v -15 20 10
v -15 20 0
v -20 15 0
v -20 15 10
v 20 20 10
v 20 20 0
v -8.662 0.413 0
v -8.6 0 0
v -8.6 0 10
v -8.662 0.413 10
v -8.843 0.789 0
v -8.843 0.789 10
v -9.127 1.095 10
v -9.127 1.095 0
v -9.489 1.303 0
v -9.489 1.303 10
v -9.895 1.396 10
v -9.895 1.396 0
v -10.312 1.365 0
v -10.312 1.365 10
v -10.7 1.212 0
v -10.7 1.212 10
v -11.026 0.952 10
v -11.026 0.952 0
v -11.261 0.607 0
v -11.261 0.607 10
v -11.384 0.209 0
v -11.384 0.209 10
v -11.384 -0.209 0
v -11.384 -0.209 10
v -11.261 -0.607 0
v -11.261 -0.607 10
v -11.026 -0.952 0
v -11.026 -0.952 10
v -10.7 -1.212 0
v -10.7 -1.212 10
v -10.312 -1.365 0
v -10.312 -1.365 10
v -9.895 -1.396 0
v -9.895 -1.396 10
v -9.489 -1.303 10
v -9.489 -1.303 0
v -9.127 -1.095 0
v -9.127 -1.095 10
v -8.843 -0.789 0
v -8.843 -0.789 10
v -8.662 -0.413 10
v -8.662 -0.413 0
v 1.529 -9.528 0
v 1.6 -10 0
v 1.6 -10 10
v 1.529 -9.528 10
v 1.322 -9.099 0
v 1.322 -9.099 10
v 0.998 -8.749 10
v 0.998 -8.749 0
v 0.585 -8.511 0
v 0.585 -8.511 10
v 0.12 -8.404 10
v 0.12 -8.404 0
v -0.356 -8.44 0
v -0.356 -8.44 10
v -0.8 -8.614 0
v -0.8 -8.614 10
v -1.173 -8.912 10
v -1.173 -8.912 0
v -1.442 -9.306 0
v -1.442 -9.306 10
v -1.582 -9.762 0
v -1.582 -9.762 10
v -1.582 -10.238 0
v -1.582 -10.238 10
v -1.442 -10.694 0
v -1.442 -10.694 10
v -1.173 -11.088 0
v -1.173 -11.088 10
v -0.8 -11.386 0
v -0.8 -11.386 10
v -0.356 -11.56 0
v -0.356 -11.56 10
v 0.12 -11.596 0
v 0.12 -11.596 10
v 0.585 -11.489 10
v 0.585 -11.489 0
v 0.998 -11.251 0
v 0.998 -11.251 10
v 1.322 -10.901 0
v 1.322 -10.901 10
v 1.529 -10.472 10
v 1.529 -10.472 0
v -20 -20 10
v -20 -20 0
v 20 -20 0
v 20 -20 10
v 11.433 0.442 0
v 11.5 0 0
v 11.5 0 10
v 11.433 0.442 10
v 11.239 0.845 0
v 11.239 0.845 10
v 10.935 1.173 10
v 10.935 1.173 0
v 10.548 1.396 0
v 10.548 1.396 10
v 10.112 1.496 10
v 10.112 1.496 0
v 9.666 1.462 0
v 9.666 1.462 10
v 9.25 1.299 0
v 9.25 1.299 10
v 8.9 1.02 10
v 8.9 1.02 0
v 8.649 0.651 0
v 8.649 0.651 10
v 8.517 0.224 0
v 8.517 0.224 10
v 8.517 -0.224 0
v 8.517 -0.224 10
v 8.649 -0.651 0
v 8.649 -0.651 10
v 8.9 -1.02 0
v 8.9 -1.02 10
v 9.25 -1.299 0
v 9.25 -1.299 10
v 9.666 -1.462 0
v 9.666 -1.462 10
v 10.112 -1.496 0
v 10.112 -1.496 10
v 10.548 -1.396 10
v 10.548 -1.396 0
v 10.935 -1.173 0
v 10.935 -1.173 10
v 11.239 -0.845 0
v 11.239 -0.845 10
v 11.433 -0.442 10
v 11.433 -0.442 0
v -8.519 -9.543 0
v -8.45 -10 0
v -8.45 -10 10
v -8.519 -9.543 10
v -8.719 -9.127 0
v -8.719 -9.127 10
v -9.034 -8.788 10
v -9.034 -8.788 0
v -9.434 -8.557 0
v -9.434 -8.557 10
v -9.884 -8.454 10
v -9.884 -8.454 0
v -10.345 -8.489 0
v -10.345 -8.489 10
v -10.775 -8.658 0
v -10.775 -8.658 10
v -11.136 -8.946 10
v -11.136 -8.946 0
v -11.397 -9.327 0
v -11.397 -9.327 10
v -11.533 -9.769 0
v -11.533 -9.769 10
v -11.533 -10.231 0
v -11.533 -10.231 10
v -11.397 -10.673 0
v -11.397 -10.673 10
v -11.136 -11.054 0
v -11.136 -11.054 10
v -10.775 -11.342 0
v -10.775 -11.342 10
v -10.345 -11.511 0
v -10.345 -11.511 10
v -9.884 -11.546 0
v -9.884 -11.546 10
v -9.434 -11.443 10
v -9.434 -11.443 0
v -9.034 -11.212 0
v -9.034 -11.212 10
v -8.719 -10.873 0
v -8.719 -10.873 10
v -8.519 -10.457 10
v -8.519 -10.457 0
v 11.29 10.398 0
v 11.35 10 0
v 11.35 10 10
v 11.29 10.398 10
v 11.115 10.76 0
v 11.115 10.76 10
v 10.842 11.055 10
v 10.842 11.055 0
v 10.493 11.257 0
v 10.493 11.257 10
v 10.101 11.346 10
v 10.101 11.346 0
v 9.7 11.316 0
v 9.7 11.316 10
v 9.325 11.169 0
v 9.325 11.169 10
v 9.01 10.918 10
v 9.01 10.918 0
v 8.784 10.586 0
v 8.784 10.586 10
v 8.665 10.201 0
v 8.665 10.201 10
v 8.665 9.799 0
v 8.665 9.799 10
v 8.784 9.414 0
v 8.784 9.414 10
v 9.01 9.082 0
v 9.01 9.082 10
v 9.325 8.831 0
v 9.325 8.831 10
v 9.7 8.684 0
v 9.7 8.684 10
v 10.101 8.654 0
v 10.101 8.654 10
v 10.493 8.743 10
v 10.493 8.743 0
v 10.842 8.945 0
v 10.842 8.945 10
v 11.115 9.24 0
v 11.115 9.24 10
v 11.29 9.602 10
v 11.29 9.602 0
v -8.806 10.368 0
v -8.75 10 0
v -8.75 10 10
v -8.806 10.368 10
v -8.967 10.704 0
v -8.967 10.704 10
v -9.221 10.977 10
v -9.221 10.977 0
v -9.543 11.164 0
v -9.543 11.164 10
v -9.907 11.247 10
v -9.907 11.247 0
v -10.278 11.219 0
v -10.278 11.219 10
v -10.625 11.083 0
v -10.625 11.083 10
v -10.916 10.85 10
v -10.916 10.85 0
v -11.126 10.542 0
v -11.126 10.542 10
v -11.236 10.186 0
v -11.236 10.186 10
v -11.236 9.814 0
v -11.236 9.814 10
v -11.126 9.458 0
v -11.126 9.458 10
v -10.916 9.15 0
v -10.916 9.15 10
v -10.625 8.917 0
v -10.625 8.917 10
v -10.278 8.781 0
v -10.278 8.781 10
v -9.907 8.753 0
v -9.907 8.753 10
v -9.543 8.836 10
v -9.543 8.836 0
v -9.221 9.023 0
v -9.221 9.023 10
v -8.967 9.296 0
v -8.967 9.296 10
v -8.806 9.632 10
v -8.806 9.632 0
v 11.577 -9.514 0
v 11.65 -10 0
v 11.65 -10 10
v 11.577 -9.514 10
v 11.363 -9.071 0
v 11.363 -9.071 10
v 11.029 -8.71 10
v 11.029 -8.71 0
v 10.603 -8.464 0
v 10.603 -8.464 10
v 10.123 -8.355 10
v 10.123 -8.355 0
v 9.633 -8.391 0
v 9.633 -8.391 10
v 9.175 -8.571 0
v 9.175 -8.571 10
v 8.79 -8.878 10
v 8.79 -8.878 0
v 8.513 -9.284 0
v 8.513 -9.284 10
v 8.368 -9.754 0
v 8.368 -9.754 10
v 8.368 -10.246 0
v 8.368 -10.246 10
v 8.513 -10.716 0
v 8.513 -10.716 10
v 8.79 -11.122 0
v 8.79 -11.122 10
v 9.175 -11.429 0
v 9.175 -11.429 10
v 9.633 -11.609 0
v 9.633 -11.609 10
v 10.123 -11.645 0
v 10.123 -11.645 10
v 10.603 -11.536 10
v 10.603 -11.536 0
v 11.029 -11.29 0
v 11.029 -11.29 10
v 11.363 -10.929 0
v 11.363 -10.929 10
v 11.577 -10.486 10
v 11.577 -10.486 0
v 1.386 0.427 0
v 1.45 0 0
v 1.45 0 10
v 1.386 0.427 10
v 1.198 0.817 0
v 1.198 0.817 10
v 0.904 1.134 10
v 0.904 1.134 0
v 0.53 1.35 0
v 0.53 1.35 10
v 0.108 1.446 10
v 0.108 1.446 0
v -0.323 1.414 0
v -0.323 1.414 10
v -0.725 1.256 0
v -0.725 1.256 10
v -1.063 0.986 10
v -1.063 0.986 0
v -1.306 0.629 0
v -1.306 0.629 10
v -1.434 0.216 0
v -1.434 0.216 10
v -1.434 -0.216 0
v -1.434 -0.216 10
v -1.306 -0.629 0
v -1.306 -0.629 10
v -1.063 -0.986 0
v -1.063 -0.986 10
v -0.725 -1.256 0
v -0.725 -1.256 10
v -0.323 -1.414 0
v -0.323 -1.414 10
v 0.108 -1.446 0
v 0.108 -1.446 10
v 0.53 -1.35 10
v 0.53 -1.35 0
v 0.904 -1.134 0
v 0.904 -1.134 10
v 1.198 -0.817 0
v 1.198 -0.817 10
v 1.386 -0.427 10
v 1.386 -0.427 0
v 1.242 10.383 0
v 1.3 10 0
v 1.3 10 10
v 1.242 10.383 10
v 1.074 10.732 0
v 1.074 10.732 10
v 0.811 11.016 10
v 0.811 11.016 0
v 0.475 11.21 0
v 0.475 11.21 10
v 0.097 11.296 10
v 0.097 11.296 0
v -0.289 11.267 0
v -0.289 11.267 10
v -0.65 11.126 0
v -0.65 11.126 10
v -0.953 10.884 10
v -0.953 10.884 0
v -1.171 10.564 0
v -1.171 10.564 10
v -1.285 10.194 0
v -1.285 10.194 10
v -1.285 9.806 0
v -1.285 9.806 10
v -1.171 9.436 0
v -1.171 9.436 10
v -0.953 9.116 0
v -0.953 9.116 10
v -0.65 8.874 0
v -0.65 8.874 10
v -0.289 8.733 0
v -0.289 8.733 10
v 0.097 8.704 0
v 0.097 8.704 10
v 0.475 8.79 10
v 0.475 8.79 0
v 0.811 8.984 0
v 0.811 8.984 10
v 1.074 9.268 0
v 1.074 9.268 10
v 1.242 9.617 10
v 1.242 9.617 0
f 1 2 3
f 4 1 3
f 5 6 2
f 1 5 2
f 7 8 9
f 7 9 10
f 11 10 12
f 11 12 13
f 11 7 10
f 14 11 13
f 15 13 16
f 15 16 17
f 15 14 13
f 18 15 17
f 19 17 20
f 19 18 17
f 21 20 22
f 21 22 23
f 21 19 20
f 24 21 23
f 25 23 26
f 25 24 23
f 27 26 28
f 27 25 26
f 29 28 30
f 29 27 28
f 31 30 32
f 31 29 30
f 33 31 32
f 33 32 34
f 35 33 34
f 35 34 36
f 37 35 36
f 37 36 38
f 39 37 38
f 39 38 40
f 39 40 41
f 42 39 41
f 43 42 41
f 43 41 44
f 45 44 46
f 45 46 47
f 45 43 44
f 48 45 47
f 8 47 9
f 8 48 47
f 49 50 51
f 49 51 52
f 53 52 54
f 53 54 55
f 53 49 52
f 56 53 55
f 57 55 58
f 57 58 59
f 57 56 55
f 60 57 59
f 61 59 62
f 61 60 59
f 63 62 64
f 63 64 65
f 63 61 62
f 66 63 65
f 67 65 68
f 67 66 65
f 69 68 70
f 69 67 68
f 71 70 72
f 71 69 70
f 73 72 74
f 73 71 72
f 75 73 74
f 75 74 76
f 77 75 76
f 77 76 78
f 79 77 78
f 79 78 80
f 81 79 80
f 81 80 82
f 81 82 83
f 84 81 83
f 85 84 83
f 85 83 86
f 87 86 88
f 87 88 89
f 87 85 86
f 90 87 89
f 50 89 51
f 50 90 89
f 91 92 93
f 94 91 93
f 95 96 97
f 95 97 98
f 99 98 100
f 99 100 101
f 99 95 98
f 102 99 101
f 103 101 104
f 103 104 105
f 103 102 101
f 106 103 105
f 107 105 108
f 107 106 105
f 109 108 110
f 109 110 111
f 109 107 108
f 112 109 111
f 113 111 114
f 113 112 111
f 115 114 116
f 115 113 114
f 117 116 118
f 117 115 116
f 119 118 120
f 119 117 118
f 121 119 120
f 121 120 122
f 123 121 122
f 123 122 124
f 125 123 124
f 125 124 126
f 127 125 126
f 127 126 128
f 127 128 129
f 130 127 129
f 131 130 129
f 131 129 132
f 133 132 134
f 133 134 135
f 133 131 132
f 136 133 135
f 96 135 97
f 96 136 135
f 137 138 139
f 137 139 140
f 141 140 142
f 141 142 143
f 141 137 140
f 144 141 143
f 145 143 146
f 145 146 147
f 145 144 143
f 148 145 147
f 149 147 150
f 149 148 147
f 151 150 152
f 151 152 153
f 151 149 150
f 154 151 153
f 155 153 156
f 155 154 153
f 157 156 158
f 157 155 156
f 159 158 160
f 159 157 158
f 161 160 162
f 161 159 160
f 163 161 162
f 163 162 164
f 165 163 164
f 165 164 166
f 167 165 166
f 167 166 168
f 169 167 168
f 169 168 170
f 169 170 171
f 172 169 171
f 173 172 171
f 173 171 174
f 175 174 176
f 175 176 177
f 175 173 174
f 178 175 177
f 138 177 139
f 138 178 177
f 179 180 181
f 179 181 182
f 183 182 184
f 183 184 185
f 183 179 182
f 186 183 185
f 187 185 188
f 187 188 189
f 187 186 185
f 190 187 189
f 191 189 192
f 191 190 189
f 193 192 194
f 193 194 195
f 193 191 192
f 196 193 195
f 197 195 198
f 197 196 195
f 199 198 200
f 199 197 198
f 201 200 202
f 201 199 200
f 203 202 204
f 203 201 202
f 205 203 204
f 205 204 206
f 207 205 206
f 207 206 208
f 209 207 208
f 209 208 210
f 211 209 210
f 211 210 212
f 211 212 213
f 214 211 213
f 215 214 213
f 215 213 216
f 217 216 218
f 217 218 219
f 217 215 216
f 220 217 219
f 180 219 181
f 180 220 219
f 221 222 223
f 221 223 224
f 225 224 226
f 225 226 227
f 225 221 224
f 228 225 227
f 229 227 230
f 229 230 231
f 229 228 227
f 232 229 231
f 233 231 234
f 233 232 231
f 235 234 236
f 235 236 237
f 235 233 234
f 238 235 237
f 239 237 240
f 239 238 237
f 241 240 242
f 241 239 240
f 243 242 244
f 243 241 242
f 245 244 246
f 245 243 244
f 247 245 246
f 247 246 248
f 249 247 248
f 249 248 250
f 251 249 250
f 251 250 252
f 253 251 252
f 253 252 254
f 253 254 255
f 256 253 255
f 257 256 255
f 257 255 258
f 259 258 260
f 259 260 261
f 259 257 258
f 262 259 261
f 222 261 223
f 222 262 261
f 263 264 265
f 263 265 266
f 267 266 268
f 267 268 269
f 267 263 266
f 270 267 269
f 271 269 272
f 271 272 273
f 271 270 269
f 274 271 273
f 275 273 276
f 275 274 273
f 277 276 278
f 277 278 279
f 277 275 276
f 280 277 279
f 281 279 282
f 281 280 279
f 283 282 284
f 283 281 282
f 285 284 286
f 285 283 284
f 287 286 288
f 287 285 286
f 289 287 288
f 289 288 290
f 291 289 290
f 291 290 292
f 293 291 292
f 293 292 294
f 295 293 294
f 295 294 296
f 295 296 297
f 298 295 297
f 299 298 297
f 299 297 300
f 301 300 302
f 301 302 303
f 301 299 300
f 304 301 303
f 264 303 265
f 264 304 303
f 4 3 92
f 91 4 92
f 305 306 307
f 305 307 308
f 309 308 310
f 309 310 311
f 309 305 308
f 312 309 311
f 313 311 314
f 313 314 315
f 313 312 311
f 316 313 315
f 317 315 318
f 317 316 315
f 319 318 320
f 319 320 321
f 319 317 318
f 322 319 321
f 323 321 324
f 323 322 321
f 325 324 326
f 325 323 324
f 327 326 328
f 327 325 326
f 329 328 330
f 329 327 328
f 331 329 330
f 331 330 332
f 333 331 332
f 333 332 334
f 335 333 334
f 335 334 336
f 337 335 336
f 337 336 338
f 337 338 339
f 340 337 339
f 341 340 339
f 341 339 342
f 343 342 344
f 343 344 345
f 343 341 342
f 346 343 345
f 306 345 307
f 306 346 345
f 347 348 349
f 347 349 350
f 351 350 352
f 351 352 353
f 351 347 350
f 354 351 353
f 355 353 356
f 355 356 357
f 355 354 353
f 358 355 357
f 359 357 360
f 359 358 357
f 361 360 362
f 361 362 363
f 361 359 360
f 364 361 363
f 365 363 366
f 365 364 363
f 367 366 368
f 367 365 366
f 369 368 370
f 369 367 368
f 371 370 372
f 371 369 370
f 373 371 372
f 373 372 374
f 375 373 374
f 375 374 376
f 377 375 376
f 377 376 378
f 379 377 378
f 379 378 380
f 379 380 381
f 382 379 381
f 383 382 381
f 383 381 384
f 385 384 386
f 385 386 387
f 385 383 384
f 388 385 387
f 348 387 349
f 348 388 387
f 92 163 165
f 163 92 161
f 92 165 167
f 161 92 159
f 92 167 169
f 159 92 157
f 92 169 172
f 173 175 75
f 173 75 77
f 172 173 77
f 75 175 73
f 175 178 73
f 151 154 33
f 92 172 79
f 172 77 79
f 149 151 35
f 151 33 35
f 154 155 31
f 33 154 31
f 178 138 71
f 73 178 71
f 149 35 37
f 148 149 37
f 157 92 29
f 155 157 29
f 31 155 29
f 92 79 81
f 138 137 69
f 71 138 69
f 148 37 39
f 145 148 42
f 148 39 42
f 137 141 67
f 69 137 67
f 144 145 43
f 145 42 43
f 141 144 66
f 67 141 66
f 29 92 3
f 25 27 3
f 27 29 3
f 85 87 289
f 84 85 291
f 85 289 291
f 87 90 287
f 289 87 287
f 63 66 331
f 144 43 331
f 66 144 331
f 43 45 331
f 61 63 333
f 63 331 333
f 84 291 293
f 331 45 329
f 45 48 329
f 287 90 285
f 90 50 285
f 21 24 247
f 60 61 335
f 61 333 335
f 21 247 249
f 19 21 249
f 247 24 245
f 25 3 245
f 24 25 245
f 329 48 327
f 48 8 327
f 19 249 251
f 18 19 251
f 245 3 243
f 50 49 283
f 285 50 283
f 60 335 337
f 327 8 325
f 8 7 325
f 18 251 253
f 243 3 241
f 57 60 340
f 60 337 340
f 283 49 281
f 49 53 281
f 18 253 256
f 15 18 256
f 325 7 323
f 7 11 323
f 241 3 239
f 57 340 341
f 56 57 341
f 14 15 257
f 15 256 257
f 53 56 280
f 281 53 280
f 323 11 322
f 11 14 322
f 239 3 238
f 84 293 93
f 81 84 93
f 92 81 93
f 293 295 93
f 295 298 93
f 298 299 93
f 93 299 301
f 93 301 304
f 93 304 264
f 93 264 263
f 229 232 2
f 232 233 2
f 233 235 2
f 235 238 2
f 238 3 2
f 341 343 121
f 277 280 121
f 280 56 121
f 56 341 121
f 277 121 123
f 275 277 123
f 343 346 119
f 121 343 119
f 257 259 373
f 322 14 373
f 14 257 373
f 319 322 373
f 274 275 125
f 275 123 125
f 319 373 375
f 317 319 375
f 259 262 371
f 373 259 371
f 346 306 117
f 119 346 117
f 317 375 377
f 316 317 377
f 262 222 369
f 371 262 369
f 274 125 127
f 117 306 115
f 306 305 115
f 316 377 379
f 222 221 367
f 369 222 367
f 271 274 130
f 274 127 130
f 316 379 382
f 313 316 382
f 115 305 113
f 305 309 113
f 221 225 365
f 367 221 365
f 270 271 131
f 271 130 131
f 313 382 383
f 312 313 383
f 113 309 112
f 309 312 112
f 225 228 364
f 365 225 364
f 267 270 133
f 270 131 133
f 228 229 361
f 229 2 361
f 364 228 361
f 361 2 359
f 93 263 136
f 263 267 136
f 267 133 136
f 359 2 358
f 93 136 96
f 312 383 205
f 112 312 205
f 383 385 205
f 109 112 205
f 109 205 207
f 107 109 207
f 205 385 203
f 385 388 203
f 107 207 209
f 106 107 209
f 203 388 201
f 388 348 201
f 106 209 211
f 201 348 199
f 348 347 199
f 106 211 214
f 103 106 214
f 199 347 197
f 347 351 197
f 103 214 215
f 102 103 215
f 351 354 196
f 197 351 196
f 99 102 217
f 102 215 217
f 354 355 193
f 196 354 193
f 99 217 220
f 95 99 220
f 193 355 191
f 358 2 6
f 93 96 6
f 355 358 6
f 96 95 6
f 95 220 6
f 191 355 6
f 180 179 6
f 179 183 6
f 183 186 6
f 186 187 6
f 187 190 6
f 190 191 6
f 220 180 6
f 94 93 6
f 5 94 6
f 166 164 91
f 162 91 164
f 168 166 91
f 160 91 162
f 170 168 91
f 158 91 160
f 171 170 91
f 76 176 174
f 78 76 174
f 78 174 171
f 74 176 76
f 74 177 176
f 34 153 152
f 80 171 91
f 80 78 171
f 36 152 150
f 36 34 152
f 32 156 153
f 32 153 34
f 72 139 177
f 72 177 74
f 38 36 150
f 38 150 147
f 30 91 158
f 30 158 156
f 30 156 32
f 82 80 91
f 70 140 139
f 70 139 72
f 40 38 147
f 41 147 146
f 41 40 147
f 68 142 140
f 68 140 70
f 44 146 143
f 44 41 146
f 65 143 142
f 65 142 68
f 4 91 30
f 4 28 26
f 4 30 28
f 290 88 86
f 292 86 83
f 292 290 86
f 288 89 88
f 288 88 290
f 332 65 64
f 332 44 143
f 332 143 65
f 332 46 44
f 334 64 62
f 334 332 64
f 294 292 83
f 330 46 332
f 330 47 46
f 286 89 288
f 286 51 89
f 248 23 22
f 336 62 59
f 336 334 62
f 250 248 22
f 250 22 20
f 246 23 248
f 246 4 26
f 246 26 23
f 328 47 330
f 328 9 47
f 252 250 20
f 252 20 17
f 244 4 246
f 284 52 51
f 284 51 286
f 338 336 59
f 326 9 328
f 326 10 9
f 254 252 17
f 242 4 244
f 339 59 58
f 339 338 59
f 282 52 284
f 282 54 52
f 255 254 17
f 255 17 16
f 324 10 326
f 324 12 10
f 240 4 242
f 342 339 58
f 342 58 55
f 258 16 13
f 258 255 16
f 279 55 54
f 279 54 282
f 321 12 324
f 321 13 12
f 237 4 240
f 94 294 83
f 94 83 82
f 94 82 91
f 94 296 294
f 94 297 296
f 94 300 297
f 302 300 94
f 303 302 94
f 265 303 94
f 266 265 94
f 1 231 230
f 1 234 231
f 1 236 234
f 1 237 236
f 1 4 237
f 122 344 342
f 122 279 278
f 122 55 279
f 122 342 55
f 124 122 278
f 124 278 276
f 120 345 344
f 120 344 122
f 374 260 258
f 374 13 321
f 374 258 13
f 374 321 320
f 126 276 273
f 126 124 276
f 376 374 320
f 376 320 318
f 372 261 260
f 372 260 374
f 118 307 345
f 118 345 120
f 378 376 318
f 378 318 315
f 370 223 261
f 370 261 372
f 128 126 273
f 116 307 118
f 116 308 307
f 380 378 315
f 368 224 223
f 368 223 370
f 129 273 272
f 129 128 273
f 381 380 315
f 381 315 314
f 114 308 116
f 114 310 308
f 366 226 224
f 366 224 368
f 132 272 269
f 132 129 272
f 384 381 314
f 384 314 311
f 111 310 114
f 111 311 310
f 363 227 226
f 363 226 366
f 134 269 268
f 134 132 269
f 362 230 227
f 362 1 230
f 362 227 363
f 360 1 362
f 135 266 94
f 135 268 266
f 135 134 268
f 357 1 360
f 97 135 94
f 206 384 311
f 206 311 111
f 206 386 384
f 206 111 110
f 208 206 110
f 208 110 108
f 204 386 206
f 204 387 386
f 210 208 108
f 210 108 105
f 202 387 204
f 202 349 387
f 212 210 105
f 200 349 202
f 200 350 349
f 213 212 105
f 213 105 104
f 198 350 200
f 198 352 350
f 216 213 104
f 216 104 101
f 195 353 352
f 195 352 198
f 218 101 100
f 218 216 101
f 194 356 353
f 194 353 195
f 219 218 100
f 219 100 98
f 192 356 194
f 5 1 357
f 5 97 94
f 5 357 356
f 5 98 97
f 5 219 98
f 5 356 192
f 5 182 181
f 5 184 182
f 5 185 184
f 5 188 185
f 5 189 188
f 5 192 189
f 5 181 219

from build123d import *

# Parameters (mm, degrees)
F0_R     = 1.55
F0_R_2   = 1.6
F0_R_3   = 1.65
F0_R_4   = 1.4
F0_R_5   = 1.25
F0_R_6   = 1.45
F0_R_7   = 1.5
F0_R_8   = 1.3
F0_R_9   = 1.35
F1_DEPTH = 10


with BuildPart() as f1:
    # F0 (on Top) → F1 (new body)
    with BuildSketch(Plane.XY):
        Polygon((-15, 20), (-20, 15), (-20, -20), (20, -20), (20, 20), align=None)
        with Locations((-10, -10)):
            Circle(F0_R, mode=Mode.SUBTRACT)
        with Locations((0, -10)):
            Circle(F0_R_2, mode=Mode.SUBTRACT)
        with Locations((10, -10)):
            Circle(F0_R_3, mode=Mode.SUBTRACT)
        with Locations((-10, 0)):
            Circle(F0_R_4, mode=Mode.SUBTRACT)
        with Locations((-10, 10)):
            Circle(F0_R_5, mode=Mode.SUBTRACT)
        Circle(F0_R_6, mode=Mode.SUBTRACT)
        with Locations((10, 0)):
            Circle(F0_R_7, mode=Mode.SUBTRACT)
        with Locations((0, 10)):
            Circle(F0_R_8, mode=Mode.SUBTRACT)
        with Locations((10, 10)):
            Circle(F0_R_9, mode=Mode.SUBTRACT)
    extrude(amount=F1_DEPTH)


solid = f1.part
